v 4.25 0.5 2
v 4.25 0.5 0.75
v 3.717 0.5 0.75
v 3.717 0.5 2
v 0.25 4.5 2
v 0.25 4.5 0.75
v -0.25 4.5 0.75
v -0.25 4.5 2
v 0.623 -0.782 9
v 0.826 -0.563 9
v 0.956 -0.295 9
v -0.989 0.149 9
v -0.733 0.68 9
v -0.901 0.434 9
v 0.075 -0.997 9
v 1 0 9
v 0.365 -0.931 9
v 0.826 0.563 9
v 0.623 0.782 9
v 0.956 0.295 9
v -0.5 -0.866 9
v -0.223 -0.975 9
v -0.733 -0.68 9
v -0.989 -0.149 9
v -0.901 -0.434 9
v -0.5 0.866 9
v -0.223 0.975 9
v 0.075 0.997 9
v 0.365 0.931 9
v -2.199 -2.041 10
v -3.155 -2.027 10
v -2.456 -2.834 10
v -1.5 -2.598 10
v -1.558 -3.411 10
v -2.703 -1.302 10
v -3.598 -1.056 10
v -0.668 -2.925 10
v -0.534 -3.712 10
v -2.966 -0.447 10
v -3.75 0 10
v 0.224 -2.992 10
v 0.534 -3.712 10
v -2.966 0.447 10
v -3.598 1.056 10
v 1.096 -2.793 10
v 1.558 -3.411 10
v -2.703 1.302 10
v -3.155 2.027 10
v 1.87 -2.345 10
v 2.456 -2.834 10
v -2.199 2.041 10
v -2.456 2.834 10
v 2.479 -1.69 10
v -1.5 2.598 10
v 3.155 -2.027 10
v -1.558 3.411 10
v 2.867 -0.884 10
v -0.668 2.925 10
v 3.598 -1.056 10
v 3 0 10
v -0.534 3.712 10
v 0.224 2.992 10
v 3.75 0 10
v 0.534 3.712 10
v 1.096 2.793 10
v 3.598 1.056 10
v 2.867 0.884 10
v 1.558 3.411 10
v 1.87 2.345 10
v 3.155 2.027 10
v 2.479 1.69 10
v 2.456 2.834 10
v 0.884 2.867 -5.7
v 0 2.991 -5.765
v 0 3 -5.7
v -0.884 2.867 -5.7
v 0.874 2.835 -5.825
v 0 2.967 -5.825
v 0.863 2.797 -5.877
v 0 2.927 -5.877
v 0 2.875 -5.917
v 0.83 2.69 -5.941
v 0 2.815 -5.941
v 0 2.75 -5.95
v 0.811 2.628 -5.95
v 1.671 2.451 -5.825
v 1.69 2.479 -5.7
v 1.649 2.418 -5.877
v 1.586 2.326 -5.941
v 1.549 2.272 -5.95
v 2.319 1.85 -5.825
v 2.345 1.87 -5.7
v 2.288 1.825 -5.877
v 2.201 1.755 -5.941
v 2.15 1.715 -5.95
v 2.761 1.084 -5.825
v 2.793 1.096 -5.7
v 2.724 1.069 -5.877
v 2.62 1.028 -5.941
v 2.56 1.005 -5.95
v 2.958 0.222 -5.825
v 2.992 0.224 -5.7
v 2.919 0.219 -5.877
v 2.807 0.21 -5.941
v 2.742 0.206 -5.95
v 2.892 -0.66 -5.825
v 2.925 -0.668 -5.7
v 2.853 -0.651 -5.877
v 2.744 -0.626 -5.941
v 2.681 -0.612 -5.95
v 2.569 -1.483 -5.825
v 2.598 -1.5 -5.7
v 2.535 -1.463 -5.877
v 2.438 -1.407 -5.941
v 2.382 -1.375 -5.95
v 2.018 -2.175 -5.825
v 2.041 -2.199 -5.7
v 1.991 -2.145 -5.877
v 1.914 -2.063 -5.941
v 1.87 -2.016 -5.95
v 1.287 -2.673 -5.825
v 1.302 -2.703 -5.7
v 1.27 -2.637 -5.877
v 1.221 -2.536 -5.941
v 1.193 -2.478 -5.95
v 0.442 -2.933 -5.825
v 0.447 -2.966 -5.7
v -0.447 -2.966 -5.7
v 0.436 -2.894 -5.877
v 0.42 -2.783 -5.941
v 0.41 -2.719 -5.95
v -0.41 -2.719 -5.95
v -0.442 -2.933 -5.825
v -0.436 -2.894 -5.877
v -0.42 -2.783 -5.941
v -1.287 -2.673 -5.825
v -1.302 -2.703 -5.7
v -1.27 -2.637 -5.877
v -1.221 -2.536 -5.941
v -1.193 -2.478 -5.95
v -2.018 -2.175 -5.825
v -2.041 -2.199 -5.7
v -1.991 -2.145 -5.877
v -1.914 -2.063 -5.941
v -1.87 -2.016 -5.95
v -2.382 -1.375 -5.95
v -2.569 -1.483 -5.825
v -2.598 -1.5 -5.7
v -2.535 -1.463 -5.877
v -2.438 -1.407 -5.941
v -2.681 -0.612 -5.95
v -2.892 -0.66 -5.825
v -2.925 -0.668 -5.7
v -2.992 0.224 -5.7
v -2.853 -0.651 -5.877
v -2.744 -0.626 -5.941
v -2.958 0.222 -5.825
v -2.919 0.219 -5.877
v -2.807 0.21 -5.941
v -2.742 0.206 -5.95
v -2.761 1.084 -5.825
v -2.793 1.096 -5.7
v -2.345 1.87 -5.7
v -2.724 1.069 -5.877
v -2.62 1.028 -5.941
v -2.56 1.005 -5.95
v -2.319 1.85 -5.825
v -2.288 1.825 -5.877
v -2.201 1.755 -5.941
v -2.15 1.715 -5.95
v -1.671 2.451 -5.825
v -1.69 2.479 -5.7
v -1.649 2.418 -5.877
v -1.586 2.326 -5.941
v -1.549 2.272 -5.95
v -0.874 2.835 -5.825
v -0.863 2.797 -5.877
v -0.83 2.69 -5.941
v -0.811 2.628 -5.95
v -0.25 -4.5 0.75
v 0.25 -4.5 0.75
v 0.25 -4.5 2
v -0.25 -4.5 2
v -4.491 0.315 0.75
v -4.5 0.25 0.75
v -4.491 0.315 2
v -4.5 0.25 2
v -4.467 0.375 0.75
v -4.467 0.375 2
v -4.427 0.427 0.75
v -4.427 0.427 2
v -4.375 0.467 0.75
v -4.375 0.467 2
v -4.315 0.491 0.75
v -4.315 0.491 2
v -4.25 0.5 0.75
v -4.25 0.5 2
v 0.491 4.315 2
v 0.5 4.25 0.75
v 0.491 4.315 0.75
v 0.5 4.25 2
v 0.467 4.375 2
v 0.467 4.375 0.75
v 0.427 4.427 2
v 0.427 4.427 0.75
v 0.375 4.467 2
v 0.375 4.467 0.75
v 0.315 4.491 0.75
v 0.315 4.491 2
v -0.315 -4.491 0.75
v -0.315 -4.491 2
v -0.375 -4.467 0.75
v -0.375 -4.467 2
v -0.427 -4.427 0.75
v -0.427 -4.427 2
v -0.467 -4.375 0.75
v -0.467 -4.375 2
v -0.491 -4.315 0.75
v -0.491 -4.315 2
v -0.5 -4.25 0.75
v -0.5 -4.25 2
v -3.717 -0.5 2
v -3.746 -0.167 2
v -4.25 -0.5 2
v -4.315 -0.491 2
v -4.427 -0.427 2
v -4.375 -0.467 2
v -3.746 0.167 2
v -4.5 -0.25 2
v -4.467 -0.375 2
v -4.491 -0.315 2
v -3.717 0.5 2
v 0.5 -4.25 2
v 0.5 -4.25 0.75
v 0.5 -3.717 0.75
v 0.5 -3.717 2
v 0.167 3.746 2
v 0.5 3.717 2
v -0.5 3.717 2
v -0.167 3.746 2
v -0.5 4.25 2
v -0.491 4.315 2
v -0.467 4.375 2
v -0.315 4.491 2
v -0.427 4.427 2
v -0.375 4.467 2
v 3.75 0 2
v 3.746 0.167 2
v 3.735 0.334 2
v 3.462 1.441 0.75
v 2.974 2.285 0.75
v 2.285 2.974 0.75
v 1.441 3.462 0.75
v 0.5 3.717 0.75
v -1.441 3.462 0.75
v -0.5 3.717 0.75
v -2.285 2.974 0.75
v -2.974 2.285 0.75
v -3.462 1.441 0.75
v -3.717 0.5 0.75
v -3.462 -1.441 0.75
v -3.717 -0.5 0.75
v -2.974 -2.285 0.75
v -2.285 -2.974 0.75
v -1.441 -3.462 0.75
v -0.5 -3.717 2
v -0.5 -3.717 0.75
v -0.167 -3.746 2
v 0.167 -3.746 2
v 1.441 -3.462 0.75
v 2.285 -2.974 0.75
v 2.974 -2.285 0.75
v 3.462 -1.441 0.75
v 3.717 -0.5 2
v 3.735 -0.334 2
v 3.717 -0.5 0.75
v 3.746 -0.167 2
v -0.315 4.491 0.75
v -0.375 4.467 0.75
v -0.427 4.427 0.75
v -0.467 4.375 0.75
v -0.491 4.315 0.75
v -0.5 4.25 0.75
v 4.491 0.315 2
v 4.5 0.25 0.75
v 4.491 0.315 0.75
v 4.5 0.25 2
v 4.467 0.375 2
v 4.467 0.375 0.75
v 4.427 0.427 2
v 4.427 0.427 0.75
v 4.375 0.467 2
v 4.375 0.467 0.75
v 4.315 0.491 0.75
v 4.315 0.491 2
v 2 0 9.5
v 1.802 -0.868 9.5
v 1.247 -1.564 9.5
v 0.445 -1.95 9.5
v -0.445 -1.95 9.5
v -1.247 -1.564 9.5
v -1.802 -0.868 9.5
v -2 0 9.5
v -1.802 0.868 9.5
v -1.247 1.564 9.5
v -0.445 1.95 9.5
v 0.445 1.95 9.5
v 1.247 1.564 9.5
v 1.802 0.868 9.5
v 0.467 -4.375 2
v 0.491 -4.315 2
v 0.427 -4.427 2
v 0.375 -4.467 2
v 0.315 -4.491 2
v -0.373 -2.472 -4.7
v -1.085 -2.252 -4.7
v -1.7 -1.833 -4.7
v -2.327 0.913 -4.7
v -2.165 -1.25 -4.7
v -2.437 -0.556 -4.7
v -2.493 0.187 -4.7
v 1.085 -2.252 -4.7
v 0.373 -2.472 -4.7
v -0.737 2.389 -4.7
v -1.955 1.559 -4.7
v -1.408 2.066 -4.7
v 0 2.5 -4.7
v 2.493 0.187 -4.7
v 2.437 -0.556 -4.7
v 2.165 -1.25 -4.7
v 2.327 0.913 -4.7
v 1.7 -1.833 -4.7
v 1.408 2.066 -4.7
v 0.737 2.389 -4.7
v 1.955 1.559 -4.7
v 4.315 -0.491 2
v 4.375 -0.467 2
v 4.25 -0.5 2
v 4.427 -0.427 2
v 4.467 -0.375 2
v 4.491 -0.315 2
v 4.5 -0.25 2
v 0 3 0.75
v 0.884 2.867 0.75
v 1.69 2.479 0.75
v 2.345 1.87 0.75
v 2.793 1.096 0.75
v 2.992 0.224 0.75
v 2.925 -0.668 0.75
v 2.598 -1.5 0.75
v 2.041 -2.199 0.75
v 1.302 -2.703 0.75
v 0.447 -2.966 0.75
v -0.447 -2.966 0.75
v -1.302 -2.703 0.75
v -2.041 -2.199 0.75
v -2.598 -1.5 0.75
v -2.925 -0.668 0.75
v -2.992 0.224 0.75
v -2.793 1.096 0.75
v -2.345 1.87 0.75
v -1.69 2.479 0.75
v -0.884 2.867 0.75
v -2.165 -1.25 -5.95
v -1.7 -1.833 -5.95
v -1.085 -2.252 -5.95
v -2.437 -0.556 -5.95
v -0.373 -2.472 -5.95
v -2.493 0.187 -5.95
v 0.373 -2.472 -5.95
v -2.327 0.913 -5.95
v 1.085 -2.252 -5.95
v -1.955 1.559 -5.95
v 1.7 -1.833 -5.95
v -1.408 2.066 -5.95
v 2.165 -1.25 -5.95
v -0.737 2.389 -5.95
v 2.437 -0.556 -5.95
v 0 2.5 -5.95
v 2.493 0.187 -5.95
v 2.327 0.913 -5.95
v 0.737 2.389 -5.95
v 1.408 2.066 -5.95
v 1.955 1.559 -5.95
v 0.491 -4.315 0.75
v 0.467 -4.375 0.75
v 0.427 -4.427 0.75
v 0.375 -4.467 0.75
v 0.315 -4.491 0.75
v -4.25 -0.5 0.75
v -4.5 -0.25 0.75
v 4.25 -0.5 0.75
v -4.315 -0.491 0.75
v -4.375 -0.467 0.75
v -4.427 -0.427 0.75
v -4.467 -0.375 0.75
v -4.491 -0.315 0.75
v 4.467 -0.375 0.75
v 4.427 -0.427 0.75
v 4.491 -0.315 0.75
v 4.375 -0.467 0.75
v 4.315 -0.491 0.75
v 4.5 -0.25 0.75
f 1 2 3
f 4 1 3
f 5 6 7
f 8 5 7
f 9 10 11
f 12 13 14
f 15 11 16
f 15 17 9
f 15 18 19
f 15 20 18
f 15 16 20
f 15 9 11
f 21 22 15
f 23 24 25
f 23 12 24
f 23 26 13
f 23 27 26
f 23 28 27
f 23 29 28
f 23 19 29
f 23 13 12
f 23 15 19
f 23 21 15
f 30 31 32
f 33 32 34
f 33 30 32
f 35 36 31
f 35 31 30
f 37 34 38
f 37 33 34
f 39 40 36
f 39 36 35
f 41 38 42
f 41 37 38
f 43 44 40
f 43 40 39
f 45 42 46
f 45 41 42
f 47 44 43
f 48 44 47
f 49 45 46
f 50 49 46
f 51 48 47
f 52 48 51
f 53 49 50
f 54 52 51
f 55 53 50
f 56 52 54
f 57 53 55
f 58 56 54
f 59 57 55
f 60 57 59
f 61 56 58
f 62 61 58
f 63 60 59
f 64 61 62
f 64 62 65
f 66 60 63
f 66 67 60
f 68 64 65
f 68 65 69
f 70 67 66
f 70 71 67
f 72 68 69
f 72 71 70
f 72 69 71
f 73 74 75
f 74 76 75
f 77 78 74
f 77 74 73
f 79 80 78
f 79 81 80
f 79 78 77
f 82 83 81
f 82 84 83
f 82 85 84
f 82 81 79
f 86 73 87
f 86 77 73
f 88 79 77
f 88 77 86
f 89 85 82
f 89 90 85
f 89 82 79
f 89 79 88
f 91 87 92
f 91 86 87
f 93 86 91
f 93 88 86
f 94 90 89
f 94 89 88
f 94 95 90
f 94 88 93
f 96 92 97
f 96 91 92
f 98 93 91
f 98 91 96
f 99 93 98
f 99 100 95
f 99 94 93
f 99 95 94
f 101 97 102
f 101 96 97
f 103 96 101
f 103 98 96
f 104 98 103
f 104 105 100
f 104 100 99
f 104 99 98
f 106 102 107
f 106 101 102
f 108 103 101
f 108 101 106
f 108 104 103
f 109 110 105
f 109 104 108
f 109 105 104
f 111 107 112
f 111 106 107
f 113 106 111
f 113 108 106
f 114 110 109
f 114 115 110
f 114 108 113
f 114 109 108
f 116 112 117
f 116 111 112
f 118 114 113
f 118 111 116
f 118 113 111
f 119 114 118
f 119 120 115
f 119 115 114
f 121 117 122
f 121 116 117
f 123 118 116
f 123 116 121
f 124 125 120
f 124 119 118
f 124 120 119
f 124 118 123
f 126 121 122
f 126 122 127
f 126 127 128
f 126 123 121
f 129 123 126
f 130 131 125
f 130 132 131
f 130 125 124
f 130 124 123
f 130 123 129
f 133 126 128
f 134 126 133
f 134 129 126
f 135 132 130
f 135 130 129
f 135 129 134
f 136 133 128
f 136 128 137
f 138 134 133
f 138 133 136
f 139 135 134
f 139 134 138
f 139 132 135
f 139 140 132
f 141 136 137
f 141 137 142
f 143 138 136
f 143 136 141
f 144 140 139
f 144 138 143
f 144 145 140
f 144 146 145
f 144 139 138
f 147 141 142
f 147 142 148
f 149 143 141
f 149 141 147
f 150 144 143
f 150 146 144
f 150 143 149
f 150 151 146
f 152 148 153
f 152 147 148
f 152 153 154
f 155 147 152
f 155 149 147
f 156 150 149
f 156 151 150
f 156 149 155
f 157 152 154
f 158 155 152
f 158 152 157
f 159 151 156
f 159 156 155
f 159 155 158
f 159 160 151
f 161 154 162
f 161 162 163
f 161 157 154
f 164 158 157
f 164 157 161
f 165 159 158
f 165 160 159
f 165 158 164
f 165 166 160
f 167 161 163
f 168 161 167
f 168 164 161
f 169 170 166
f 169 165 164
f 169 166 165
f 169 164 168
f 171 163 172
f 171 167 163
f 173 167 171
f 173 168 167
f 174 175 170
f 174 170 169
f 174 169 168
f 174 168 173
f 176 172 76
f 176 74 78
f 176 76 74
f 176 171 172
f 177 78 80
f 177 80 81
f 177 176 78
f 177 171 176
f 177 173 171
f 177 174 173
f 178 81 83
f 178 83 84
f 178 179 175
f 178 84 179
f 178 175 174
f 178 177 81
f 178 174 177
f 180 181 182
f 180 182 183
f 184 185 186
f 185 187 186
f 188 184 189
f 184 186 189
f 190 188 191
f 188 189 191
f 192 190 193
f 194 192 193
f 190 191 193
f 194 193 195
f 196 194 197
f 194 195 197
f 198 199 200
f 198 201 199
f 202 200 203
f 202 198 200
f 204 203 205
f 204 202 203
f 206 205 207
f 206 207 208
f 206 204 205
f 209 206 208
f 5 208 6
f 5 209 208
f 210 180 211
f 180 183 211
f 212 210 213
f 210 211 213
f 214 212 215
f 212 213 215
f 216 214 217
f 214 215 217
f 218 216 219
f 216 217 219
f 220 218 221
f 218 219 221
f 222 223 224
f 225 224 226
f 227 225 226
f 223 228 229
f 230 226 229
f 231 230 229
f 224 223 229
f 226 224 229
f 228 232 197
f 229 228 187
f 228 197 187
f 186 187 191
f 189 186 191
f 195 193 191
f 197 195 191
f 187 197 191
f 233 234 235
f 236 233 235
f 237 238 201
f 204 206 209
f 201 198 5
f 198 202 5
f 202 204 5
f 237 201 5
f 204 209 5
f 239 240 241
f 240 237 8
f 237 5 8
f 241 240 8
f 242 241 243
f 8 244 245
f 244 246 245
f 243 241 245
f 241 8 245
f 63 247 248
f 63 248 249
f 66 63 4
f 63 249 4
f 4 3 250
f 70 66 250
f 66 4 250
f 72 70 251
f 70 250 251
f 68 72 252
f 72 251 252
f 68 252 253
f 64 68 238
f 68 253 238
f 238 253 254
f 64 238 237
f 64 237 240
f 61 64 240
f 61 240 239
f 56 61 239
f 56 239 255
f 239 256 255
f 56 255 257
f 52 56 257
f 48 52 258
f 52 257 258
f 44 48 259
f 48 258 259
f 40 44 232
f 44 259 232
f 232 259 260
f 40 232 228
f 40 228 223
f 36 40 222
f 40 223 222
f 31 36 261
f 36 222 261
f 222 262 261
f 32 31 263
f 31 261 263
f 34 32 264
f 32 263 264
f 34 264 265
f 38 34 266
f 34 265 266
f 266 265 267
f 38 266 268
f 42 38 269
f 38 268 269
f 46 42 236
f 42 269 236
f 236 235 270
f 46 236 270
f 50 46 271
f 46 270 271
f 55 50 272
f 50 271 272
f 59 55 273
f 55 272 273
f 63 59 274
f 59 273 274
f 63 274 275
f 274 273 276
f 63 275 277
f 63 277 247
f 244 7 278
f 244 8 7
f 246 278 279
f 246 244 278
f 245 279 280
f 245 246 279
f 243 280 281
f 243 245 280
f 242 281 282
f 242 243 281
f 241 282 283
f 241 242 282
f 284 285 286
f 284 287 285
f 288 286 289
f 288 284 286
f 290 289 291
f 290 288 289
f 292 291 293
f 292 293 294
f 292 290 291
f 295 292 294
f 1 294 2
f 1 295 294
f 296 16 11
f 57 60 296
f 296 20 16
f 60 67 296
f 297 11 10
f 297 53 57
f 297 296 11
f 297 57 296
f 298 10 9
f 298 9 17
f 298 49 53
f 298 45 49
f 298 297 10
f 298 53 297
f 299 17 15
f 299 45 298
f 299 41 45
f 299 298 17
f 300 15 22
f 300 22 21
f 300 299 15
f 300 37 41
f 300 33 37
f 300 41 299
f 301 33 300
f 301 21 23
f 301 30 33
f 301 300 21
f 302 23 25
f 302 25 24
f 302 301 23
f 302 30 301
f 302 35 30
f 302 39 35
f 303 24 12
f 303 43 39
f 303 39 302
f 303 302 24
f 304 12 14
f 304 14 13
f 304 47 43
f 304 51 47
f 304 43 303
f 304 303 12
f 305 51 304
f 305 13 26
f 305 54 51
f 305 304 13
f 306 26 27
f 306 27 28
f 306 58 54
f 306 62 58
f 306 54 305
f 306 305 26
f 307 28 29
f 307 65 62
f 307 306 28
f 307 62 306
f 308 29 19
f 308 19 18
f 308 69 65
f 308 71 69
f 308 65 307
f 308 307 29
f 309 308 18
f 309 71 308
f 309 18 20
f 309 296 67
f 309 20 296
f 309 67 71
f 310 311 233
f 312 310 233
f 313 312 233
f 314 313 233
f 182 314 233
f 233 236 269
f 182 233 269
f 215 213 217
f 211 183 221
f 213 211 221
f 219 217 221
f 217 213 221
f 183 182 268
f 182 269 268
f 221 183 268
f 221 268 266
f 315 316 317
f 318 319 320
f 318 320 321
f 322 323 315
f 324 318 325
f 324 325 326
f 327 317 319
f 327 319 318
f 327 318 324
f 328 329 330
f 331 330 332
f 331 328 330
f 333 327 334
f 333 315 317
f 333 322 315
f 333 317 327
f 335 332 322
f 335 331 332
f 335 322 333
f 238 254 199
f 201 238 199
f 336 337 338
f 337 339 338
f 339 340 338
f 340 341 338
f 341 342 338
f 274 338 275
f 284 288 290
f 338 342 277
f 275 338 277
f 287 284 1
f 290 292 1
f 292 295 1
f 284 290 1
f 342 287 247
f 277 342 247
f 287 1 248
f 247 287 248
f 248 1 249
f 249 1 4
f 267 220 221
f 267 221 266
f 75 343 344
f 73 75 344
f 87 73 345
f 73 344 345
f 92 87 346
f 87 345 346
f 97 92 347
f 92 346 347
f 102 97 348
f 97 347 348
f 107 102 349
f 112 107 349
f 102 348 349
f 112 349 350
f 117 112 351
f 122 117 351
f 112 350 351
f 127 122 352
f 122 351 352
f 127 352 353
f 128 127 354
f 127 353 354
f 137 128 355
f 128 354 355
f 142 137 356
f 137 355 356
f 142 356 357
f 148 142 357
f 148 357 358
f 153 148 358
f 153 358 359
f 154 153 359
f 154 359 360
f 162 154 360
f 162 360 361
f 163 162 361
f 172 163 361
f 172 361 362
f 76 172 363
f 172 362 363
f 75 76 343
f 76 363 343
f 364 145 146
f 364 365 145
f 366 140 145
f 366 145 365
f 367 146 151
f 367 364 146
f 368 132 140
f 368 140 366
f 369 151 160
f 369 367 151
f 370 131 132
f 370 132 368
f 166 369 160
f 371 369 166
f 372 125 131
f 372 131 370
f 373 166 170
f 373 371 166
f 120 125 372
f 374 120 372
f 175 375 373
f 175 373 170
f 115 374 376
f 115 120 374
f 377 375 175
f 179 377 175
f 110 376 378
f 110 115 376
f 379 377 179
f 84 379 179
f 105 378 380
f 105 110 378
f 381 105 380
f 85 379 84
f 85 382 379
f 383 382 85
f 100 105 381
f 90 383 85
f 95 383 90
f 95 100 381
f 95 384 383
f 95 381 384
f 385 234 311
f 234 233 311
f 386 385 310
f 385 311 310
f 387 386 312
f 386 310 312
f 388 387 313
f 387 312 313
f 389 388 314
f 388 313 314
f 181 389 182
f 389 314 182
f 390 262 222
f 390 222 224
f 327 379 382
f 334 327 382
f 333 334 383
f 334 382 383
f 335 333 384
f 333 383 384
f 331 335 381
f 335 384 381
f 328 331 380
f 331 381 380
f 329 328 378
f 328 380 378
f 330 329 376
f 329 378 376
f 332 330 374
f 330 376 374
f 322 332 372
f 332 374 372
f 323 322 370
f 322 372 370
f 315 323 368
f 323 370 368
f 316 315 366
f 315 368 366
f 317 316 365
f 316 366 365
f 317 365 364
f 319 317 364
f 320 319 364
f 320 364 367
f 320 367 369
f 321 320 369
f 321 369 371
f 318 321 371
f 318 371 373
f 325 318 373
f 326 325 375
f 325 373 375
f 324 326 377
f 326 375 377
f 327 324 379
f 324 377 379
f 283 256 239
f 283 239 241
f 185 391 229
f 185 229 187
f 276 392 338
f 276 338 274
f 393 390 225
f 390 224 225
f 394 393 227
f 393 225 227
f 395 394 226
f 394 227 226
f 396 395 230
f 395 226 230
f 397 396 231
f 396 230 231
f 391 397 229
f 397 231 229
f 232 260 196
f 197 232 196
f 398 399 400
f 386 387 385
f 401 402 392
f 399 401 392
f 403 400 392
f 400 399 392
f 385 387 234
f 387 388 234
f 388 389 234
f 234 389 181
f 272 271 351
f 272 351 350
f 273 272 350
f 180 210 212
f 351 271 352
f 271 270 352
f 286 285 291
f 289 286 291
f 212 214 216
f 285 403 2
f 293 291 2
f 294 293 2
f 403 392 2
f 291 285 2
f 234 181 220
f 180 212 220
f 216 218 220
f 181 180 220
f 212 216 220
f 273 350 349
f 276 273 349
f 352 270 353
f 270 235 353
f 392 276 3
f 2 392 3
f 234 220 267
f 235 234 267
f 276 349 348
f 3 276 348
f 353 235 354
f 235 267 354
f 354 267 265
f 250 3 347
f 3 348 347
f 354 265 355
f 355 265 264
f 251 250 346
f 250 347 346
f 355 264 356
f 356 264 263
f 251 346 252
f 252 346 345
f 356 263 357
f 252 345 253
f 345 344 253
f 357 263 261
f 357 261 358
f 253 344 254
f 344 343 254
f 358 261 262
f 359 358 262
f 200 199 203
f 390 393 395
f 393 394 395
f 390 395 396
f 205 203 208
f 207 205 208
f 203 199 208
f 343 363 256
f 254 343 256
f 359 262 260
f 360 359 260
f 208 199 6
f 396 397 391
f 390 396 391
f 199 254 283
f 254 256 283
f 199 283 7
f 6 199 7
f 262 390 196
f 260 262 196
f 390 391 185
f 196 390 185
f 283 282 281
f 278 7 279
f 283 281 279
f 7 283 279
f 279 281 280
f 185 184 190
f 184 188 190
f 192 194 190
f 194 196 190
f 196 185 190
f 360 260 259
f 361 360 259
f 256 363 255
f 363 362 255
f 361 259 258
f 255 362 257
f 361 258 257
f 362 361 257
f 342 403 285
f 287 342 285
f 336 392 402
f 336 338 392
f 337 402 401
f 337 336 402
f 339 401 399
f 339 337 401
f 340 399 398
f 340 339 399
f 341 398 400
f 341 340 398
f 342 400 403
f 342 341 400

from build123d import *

# Parameters (mm, degrees)
SKETCH1_R               = 3.75
BOSS_EXTRUDE1_DEPTH     = 10
SKETCH4_W               = 1
SKETCH4_H               = 1
BOSS_EXTRUDE2_DEPTH     = 2
CUT_EXTRUDE1_DEPTH      = 6.5
CUT_EXTRUDE1_DEPTH_BACK = 6.5
SKETCH5_W               = 3.094482754
SKETCH5_H               = 13.244386188
SKETCH6_R               = 3
BOSS_EXTRUDE3_DEPTH     = 6.7
SKETCH7_R               = 2.5
CUT_EXTRUDE2_DEPTH      = 1.25
FILLET2_R               = 0.25
FILLET3_R               = 0.25


with BuildPart() as part:
    # Sketch1 → Boss-Extrude1 (new body)
    with BuildSketch(Plane.XY):
        Circle(SKETCH1_R)
    extrude(amount=BOSS_EXTRUDE1_DEPTH)

    # Sketch3 → Cut-Revolve1 (revolve, cut)
    with BuildSketch(Plane(origin=(0, 0, 0), x_dir=(1, 0, 0), z_dir=(0, 1, 0)), mode=Mode.PRIVATE) as cut_revolve1_sk:
        Polygon((-3, -10), (0, -10), (0, -9), (-1, -9), align=None)
    revolve(cut_revolve1_sk.sketch.rotate(Axis((0, 0, 10), (0, 0, -1)), 180), axis=Axis((0, 0, 10), (0, 0, -1)), mode=Mode.SUBTRACT)

    # Sketch4 → Boss-Extrude2 (add)
    with BuildSketch(Plane(origin=(0, 0, 0), x_dir=(-1, 0, 0), z_dir=(0, 0, -1))):
        with Locations((0, 4)):
            Rectangle(SKETCH4_W, SKETCH4_H)
        with Locations((-4, 0)):
            Rectangle(SKETCH4_W, SKETCH4_H)
        with Locations((4, 0)):
            Rectangle(SKETCH4_W, SKETCH4_H)
        with Locations((0, -4)):
            Rectangle(SKETCH4_W, SKETCH4_H)
    extrude(amount=-BOSS_EXTRUDE2_DEPTH)

    # Sketch5 → Cut-Extrude1 (cut, two sides: drawn at the far end of the back side and taken through both)
    with BuildSketch(Plane(origin=(0, 0, 0), x_dir=(0, 0, -1), z_dir=(1, 0, 0)).offset(-CUT_EXTRUDE1_DEPTH_BACK)):
        with Locations((0.797241377, 0.144409195)):
            Rectangle(SKETCH5_W, SKETCH5_H)
    extrude(amount=CUT_EXTRUDE1_DEPTH + CUT_EXTRUDE1_DEPTH_BACK, mode=Mode.SUBTRACT)

    # Sketch6 → Boss-Extrude3 (add)
    with BuildSketch(Plane(origin=(0, 0, 0.75), x_dir=(-1, 0, 0), z_dir=(0, 0, -1))):
        with Locations(Location((0, 0, 0), (0, 0, 90))):
            Circle(SKETCH6_R)
    extrude(amount=BOSS_EXTRUDE3_DEPTH)

    # Sketch7 → Cut-Extrude2 (cut)
    with BuildSketch(Plane(origin=(0, 0, -5.95), x_dir=(-1, 0, 0), z_dir=(0, 0, -1))):
        with Locations(Location((0, 0, 0), (0, 0, 90))):
            Circle(SKETCH7_R)
    extrude(amount=-CUT_EXTRUDE2_DEPTH, mode=Mode.SUBTRACT)

    # Fillet2
    fillet2_edges = [part.edges().sort_by_distance(p)[0] for p in [
        (0, -3, -5.95),
    ]]
    fillet(fillet2_edges, radius=FILLET2_R)

    # Fillet3
    fillet3_edges = [part.edges().sort_by_distance(p)[0] for p in [
        (4.5, 0.5, 1.375),
        (4.5, -0.5, 1.375),
        (-0.5, 4.5, 1.375),
        (0.5, 4.5, 1.375),
        (-4.5, -0.5, 1.375),
        (-4.5, 0.5, 1.375),
        (0.5, -4.5, 1.375),
        (-0.5, -4.5, 1.375),
    ]]
    fillet(fillet3_edges, radius=FILLET3_R)


solid = part.part
